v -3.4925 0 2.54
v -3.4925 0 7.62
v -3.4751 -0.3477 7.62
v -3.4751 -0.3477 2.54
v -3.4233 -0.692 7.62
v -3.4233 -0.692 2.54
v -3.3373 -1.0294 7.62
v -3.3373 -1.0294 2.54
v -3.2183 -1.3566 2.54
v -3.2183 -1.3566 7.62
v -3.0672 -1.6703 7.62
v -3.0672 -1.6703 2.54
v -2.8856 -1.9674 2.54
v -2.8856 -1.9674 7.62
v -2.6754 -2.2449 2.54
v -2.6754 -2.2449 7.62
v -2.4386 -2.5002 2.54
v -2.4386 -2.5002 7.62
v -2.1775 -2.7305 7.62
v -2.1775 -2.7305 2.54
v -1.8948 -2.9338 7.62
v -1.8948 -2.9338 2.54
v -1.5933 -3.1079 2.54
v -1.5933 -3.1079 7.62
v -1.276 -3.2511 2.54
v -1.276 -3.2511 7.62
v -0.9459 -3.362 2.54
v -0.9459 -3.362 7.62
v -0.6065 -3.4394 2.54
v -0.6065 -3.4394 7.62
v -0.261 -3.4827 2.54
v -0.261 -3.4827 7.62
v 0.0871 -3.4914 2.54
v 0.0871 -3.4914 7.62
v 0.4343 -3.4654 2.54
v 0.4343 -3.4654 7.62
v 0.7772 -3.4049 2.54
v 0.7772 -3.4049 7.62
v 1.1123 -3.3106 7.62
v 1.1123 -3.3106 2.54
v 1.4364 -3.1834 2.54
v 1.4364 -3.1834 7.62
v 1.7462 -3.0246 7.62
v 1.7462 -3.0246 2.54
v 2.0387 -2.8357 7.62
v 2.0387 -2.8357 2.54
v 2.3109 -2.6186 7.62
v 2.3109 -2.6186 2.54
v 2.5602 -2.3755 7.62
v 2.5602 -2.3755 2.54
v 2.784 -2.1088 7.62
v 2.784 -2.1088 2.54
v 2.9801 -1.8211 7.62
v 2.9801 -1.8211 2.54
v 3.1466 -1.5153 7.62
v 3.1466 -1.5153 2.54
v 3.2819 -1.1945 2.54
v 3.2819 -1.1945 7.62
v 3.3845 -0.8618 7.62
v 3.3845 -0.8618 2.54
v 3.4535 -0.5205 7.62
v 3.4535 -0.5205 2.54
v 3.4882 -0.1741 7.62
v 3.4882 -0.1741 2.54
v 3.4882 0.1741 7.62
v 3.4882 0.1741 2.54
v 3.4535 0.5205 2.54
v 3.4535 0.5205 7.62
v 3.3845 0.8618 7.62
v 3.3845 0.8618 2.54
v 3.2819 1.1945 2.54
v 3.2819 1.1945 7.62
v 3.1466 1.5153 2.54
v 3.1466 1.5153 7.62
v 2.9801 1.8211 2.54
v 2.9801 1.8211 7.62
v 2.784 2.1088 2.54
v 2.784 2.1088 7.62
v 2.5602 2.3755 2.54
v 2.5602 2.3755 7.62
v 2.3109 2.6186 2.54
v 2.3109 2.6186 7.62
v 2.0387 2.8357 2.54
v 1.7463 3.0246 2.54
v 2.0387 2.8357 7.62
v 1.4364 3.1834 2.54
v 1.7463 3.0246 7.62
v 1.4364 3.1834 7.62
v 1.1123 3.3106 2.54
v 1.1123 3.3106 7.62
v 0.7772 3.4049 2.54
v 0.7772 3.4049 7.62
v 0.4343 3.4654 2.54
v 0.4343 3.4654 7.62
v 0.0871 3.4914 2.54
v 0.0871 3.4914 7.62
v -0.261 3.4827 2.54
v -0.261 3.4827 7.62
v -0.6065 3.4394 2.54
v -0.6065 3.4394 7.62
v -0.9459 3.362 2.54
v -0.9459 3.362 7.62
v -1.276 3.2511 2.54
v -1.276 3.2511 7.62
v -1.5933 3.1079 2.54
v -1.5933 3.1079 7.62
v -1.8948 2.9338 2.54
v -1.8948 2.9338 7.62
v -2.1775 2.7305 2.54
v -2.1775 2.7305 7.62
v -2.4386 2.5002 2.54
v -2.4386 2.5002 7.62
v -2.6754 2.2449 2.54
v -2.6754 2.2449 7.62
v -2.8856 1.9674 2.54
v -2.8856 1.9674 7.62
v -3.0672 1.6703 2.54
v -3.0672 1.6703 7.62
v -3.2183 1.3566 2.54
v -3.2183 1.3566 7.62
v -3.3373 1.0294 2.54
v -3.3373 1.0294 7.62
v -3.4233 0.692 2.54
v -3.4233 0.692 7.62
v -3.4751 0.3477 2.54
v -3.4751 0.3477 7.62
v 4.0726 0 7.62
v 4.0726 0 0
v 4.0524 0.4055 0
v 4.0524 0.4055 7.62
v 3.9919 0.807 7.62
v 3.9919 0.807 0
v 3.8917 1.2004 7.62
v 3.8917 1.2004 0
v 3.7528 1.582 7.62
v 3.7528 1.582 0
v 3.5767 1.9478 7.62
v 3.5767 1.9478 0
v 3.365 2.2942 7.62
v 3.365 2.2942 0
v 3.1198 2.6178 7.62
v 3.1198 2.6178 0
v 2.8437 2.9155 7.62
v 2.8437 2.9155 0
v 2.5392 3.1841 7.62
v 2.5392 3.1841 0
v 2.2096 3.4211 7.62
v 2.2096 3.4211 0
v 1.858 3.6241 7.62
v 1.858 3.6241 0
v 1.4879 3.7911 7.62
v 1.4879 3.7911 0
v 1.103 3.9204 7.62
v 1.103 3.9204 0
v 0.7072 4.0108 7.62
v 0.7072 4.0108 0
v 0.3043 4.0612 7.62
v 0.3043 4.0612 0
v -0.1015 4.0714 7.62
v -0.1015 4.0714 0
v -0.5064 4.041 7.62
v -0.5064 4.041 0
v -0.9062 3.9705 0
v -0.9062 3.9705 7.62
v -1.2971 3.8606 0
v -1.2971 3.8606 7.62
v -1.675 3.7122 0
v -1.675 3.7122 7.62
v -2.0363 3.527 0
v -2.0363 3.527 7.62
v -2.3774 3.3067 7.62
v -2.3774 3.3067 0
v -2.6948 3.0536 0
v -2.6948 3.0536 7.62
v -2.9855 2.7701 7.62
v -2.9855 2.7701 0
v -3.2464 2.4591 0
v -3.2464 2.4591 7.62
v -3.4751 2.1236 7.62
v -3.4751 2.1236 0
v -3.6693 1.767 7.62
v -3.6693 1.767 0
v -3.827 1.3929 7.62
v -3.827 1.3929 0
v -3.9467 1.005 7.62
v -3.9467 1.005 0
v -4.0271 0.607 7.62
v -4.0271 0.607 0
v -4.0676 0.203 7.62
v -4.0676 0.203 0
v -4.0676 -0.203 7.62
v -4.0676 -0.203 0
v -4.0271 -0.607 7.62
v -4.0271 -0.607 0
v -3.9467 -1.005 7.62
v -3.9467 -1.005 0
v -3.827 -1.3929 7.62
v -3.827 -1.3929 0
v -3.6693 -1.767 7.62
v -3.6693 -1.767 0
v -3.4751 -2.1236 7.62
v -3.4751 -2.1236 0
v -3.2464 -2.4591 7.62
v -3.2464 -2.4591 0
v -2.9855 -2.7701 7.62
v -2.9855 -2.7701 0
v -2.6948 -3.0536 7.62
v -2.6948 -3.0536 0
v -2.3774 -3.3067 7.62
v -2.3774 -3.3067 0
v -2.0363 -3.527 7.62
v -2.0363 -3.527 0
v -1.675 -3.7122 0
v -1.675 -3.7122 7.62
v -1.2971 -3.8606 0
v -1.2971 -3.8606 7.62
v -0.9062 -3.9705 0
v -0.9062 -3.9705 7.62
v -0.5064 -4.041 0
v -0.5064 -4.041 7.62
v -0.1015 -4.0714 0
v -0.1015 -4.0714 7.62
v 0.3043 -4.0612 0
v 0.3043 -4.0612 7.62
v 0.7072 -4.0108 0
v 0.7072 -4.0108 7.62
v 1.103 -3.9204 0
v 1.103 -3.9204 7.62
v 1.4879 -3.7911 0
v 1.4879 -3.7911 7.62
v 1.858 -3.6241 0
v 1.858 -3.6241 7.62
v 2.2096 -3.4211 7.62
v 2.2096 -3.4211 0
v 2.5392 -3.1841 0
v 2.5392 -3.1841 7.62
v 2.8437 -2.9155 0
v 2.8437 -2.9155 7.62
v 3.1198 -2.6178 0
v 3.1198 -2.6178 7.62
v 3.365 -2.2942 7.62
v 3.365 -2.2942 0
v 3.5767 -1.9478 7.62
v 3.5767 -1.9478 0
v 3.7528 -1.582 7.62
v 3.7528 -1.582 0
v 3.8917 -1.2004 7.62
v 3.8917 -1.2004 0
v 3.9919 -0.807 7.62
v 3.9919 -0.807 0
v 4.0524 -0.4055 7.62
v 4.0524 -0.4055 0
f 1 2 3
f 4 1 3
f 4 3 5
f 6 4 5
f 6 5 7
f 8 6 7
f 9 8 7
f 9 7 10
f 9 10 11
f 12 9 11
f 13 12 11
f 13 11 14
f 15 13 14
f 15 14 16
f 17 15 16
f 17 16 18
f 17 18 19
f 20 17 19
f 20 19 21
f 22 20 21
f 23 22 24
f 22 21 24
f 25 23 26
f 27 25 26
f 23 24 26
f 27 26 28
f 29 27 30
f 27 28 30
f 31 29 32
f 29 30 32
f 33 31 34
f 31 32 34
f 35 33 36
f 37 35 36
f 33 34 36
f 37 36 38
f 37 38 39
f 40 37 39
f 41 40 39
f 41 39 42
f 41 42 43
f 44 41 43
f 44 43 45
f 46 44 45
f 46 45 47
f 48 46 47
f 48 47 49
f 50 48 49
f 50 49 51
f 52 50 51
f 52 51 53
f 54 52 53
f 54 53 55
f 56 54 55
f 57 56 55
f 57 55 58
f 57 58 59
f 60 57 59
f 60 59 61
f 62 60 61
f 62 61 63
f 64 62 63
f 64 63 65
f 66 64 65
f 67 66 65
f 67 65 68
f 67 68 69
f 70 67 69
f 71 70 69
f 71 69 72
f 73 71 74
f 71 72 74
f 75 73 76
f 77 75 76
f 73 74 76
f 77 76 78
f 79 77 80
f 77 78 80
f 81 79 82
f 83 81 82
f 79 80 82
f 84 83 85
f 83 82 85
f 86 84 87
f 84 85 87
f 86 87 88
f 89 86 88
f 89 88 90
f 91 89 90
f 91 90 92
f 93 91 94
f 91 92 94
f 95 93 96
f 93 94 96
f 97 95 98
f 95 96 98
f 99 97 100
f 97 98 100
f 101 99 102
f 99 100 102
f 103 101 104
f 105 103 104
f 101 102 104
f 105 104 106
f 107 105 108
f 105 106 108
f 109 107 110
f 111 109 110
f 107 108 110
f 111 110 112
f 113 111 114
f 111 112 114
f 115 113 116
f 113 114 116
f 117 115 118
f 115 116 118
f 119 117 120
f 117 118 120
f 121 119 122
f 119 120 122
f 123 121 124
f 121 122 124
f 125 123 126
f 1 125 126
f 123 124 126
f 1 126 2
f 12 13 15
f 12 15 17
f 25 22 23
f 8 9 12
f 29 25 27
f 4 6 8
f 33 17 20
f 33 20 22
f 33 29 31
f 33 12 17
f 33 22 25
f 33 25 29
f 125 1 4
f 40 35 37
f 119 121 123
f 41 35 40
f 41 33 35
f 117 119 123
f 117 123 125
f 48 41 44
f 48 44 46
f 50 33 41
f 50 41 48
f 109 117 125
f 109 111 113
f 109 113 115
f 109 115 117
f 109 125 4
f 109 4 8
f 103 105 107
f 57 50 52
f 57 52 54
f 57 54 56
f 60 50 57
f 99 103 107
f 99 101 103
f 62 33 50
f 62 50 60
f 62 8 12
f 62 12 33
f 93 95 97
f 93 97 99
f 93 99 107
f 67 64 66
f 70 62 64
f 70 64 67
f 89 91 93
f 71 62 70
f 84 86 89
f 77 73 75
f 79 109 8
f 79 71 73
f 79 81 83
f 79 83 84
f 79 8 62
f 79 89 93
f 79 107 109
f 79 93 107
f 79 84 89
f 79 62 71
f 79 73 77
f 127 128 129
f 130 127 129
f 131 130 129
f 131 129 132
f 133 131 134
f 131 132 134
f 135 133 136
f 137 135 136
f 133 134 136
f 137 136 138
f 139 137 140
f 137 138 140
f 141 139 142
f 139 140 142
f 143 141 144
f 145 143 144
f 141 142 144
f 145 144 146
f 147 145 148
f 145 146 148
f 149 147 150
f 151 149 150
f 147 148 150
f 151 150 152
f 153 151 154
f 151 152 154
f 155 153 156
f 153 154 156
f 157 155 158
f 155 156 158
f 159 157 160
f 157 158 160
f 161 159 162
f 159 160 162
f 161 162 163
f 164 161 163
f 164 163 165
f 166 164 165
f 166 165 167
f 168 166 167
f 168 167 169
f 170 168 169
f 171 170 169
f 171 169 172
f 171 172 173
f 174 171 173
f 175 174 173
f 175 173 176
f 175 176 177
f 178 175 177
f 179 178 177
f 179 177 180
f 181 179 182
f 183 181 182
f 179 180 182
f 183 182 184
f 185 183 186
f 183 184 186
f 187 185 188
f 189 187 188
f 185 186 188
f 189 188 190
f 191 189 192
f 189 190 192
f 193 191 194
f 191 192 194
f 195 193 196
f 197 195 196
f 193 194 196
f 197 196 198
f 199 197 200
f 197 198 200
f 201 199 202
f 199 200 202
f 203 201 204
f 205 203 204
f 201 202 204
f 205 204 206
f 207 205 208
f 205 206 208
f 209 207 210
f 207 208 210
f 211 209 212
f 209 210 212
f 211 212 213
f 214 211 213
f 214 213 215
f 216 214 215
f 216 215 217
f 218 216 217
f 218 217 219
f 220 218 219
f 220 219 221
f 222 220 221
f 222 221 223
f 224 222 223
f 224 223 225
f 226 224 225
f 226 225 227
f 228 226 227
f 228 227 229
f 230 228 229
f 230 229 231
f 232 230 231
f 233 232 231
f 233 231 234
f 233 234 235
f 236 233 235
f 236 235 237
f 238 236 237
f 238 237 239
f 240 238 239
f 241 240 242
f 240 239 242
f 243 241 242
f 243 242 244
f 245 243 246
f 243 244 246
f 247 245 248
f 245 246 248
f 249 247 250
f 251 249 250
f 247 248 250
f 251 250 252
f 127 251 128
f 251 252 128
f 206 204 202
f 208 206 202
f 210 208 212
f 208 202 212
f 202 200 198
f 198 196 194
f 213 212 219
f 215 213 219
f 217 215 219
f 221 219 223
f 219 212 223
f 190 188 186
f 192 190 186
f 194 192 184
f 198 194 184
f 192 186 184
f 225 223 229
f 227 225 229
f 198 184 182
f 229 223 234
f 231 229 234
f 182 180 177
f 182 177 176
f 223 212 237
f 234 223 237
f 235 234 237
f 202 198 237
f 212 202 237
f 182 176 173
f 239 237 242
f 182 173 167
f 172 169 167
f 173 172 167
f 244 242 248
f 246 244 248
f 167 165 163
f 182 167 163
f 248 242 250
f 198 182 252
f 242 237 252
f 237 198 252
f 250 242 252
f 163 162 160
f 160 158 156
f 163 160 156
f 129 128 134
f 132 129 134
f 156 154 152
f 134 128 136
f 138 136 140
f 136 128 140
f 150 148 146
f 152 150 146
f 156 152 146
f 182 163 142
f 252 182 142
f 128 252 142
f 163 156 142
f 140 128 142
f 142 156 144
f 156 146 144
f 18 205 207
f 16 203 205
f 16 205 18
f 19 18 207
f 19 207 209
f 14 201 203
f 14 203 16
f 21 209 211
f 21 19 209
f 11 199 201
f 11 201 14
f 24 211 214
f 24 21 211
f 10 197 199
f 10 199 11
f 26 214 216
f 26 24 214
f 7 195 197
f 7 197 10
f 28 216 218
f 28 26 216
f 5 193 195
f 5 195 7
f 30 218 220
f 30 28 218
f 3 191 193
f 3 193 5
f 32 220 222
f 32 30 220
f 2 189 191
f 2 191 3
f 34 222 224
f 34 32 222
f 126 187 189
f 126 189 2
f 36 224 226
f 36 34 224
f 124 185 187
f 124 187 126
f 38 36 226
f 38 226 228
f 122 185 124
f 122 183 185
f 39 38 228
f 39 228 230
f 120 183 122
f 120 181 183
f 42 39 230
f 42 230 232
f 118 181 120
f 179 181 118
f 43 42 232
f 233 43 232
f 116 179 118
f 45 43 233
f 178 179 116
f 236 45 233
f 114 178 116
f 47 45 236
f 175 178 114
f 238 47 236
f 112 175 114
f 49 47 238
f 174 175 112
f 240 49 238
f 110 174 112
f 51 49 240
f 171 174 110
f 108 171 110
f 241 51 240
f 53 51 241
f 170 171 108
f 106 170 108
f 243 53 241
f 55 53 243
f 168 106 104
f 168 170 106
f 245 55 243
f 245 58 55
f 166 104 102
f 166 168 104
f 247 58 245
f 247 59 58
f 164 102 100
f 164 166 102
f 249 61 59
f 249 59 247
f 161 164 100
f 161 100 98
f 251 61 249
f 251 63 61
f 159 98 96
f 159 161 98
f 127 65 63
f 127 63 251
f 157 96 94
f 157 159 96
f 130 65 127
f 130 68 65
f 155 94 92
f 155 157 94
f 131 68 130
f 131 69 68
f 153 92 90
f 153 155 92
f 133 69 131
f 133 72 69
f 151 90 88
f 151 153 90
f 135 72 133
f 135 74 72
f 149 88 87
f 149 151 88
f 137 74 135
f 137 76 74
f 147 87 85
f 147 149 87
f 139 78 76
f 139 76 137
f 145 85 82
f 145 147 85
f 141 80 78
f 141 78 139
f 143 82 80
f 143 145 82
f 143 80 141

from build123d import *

# Parameters (mm, degrees)
F1_R     = 4.072632
F2_DEPTH = 7.62
F3_D     = 6.985
F4_R     = 4.013855
F5_DEPTH = 2.54


with BuildPart() as f2:
    # F1 (on Top) → F2 (new body)
    with BuildSketch(Plane.XY):
        Circle(F1_R)
    extrude(amount=F2_DEPTH)

    # F3 (through all)
    with Locations(Plane(origin=(0, 0, 0), x_dir=(1, 0, 0), z_dir=(0, 0, -1))):
        with Locations((0, 0)):
            Hole(F3_D / 2)

    # F4 (on Top) → F5 (join)
    with BuildSketch(Plane.XY):
        Circle(F4_R)
    extrude(amount=F5_DEPTH)


solid = f2.part
